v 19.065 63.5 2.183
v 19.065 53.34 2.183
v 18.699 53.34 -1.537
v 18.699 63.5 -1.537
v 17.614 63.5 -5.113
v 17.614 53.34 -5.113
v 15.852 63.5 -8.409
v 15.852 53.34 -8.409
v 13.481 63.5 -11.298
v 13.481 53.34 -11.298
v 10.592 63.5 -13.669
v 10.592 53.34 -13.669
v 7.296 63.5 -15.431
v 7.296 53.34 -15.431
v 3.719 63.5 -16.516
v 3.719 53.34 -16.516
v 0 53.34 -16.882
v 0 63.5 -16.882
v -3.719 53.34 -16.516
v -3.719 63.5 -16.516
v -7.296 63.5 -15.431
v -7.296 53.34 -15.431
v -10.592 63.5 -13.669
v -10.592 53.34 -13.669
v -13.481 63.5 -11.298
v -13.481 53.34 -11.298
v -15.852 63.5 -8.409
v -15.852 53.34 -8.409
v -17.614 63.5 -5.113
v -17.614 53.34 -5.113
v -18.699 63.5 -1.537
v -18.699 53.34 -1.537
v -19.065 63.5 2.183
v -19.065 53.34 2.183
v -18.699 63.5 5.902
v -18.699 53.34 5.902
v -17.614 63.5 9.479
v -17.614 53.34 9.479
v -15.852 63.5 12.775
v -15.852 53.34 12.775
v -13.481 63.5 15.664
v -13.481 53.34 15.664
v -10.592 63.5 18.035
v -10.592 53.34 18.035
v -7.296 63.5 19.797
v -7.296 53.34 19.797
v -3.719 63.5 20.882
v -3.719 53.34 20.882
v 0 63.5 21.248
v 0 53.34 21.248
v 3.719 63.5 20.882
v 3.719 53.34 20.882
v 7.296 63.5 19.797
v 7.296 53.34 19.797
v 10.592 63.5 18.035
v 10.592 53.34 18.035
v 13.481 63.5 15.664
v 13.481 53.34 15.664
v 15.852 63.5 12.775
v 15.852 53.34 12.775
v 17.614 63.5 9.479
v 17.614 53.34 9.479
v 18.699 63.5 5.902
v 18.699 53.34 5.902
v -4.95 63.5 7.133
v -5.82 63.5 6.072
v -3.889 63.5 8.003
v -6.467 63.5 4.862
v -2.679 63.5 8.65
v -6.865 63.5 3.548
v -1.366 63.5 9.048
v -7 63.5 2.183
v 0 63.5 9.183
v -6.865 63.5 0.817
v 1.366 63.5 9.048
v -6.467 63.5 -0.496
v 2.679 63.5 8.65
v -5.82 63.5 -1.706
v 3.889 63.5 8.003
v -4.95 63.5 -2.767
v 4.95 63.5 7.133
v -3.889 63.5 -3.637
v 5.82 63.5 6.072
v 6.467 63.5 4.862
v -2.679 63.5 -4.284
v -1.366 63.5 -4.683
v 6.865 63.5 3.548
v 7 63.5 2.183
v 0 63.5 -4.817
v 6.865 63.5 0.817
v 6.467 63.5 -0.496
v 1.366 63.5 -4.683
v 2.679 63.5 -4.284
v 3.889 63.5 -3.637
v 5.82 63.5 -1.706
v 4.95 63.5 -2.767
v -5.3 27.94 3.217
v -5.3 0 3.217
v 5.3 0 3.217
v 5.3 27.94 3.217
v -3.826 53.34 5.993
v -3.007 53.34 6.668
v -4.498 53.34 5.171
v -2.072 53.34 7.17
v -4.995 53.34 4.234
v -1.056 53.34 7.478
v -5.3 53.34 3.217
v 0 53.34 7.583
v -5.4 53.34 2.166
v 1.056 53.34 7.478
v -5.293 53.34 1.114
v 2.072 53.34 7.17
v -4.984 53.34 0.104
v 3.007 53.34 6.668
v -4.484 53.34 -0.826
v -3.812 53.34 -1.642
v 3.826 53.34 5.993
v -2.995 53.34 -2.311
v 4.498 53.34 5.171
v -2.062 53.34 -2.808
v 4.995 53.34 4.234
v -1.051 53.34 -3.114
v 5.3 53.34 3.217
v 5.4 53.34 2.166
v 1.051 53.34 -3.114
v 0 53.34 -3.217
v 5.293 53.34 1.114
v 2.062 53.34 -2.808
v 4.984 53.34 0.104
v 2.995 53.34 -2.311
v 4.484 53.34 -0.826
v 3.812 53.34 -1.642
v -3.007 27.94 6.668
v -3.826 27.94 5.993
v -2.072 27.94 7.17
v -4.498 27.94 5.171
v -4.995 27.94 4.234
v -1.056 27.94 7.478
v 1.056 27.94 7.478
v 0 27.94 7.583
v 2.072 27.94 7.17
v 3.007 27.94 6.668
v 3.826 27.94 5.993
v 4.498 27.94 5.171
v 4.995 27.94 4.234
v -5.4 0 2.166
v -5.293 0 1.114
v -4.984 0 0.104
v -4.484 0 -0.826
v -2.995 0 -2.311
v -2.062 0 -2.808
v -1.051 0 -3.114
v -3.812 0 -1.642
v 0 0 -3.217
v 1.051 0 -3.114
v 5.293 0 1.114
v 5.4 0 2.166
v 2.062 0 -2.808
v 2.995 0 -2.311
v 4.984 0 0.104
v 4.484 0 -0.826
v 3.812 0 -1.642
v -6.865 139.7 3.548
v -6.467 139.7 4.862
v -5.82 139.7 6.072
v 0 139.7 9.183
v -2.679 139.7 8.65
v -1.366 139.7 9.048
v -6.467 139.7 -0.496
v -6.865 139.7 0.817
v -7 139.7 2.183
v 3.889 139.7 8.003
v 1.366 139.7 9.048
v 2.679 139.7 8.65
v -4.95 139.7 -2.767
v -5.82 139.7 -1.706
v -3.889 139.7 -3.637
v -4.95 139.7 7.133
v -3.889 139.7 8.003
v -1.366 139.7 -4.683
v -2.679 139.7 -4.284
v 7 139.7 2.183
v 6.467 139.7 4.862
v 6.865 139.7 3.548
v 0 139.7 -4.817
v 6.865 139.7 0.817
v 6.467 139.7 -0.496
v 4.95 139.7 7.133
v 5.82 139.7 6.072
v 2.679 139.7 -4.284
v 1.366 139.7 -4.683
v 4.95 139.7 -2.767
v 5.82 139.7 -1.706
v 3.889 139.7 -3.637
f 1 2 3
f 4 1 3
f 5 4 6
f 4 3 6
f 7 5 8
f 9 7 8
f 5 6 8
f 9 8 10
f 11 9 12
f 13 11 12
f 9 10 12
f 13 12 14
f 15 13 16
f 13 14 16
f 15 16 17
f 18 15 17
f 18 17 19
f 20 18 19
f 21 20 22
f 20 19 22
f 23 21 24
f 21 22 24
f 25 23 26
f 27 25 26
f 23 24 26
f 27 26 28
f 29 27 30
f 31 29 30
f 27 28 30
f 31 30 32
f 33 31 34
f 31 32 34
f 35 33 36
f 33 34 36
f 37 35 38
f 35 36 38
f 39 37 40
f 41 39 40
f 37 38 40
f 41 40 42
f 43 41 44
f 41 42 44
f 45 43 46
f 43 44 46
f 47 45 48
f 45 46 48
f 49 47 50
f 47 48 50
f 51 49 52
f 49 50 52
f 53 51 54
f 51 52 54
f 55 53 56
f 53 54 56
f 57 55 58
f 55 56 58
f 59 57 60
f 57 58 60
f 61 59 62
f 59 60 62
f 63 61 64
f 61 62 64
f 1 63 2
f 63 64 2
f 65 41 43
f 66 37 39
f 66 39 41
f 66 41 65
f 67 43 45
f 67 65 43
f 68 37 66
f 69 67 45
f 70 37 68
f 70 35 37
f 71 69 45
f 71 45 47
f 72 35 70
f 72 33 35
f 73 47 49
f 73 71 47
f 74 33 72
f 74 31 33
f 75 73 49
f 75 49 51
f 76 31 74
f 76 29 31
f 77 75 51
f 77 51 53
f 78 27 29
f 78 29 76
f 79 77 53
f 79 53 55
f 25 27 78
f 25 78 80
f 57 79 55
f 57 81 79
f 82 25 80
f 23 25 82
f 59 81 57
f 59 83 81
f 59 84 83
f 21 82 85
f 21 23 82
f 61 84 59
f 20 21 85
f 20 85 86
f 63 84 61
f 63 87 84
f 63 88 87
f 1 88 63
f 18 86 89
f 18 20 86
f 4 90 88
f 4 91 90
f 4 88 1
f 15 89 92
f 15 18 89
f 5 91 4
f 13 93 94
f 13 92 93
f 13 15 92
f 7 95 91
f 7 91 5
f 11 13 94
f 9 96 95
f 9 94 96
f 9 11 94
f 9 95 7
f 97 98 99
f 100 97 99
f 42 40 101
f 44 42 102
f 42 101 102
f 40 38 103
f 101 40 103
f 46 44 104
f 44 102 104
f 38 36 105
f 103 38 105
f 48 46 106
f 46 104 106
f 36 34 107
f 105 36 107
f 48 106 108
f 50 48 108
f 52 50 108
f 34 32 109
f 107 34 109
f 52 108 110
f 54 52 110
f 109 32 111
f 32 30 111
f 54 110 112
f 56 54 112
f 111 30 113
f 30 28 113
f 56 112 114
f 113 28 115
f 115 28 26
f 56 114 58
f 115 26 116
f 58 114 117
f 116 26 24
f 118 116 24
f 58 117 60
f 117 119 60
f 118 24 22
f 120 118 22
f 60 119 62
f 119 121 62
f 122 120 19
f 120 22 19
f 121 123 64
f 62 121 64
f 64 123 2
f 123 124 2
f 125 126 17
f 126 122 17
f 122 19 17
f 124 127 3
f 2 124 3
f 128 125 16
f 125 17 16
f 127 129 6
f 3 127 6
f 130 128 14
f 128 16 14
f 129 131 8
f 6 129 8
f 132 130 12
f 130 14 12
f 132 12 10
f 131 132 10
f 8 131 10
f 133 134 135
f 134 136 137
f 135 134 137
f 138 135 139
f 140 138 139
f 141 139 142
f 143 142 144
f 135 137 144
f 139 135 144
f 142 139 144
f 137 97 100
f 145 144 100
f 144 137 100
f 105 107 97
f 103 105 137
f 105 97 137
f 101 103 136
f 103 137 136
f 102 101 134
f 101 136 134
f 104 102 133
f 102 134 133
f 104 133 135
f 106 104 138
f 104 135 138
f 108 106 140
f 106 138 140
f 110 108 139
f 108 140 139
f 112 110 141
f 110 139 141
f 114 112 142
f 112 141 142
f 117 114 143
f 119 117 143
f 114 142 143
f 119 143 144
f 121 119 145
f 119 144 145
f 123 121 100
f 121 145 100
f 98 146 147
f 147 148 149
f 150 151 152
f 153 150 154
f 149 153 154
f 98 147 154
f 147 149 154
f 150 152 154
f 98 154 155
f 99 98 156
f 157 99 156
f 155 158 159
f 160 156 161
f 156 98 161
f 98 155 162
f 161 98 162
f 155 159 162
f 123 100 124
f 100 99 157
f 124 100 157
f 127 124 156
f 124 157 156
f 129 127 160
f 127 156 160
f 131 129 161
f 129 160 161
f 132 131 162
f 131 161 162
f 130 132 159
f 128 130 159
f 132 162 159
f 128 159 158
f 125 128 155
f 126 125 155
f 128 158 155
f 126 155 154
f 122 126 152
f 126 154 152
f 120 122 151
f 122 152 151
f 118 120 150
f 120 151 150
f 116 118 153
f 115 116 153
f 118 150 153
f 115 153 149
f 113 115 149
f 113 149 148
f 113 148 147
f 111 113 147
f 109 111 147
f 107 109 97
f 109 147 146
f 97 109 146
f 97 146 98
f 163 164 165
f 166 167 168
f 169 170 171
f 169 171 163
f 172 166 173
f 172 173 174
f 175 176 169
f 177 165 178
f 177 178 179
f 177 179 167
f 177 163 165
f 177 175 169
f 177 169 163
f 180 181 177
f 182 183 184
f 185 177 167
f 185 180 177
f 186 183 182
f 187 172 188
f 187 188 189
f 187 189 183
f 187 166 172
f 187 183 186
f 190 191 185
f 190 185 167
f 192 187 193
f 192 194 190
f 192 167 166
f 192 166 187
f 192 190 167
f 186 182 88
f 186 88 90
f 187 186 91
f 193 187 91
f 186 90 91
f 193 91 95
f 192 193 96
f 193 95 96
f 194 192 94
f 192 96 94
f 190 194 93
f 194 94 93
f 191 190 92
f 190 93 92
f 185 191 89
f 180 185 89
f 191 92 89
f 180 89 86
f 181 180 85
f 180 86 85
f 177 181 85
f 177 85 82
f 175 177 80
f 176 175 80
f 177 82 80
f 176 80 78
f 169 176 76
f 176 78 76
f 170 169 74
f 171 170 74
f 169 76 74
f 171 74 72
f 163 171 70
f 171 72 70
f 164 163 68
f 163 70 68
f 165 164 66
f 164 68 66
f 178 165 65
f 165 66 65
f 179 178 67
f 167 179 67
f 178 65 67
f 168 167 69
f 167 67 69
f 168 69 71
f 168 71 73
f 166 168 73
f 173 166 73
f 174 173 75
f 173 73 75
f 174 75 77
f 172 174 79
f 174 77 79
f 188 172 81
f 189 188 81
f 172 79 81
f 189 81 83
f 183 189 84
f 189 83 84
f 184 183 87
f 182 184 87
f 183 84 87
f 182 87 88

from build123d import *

# Parameters (mm, degrees)
BOSS_EXTRUDE1_DEPTH = 27.94
BOSS_EXTRUDE3_DEPTH = 25.4
SKETCH5_R           = 19.06504515
BOSS_EXTRUDE4_DEPTH = 10.16
SKETCH6_R           = 7
BOSS_EXTRUDE5_DEPTH = 76.2


with BuildPart() as part:
    # Sketch1 → Boss-Extrude1 (new body)
    with BuildSketch(Plane(origin=(0, 0, 0), x_dir=(1, 0, 0), z_dir=(0, 1, 0))):
        with BuildLine():
            Line((-5.3, -3.217204022), (5.3, -3.217204022))
            ThreePointArc((5.3, -3.217204022), (0, 3.217204022), (-5.3, -3.217204022))
        make_face()
    extrude(amount=BOSS_EXTRUDE1_DEPTH)

    # Sketch4 → Boss-Extrude3 (add)
    with BuildSketch(Plane(origin=(0, 27.94, 0), x_dir=(1, 0, 0), z_dir=(0, 1, 0))):
        with BuildLine():
            Line((5.3, -3.217204022), (-5.3, -3.217204022))
            ThreePointArc((-5.3, -3.217204022), (0, -7.582795978), (5.3, -3.217204022))
        make_face()
        with BuildLine():
            Line((-5.3, -3.217204022), (5.3, -3.217204022))
            ThreePointArc((5.3, -3.217204022), (0, 3.217204022), (-5.3, -3.217204022))
        make_face()
    extrude(amount=BOSS_EXTRUDE3_DEPTH)

    # Sketch5 → Boss-Extrude4 (add)
    with BuildSketch(Plane(origin=(0, 53.34, 0), x_dir=(1, 0, 0), z_dir=(0, 1, 0))):
        with Locations((0, -2.182795978)):
            Circle(SKETCH5_R)
    extrude(amount=BOSS_EXTRUDE4_DEPTH)

    # Sketch6 → Boss-Extrude5 (add)
    with BuildSketch(Plane(origin=(0, 63.5, 0), x_dir=(1, 0, 0), z_dir=(0, 1, 0))):
        with Locations((0, -2.182795978)):
            Circle(SKETCH6_R)
    extrude(amount=BOSS_EXTRUDE5_DEPTH)


solid = part.part
